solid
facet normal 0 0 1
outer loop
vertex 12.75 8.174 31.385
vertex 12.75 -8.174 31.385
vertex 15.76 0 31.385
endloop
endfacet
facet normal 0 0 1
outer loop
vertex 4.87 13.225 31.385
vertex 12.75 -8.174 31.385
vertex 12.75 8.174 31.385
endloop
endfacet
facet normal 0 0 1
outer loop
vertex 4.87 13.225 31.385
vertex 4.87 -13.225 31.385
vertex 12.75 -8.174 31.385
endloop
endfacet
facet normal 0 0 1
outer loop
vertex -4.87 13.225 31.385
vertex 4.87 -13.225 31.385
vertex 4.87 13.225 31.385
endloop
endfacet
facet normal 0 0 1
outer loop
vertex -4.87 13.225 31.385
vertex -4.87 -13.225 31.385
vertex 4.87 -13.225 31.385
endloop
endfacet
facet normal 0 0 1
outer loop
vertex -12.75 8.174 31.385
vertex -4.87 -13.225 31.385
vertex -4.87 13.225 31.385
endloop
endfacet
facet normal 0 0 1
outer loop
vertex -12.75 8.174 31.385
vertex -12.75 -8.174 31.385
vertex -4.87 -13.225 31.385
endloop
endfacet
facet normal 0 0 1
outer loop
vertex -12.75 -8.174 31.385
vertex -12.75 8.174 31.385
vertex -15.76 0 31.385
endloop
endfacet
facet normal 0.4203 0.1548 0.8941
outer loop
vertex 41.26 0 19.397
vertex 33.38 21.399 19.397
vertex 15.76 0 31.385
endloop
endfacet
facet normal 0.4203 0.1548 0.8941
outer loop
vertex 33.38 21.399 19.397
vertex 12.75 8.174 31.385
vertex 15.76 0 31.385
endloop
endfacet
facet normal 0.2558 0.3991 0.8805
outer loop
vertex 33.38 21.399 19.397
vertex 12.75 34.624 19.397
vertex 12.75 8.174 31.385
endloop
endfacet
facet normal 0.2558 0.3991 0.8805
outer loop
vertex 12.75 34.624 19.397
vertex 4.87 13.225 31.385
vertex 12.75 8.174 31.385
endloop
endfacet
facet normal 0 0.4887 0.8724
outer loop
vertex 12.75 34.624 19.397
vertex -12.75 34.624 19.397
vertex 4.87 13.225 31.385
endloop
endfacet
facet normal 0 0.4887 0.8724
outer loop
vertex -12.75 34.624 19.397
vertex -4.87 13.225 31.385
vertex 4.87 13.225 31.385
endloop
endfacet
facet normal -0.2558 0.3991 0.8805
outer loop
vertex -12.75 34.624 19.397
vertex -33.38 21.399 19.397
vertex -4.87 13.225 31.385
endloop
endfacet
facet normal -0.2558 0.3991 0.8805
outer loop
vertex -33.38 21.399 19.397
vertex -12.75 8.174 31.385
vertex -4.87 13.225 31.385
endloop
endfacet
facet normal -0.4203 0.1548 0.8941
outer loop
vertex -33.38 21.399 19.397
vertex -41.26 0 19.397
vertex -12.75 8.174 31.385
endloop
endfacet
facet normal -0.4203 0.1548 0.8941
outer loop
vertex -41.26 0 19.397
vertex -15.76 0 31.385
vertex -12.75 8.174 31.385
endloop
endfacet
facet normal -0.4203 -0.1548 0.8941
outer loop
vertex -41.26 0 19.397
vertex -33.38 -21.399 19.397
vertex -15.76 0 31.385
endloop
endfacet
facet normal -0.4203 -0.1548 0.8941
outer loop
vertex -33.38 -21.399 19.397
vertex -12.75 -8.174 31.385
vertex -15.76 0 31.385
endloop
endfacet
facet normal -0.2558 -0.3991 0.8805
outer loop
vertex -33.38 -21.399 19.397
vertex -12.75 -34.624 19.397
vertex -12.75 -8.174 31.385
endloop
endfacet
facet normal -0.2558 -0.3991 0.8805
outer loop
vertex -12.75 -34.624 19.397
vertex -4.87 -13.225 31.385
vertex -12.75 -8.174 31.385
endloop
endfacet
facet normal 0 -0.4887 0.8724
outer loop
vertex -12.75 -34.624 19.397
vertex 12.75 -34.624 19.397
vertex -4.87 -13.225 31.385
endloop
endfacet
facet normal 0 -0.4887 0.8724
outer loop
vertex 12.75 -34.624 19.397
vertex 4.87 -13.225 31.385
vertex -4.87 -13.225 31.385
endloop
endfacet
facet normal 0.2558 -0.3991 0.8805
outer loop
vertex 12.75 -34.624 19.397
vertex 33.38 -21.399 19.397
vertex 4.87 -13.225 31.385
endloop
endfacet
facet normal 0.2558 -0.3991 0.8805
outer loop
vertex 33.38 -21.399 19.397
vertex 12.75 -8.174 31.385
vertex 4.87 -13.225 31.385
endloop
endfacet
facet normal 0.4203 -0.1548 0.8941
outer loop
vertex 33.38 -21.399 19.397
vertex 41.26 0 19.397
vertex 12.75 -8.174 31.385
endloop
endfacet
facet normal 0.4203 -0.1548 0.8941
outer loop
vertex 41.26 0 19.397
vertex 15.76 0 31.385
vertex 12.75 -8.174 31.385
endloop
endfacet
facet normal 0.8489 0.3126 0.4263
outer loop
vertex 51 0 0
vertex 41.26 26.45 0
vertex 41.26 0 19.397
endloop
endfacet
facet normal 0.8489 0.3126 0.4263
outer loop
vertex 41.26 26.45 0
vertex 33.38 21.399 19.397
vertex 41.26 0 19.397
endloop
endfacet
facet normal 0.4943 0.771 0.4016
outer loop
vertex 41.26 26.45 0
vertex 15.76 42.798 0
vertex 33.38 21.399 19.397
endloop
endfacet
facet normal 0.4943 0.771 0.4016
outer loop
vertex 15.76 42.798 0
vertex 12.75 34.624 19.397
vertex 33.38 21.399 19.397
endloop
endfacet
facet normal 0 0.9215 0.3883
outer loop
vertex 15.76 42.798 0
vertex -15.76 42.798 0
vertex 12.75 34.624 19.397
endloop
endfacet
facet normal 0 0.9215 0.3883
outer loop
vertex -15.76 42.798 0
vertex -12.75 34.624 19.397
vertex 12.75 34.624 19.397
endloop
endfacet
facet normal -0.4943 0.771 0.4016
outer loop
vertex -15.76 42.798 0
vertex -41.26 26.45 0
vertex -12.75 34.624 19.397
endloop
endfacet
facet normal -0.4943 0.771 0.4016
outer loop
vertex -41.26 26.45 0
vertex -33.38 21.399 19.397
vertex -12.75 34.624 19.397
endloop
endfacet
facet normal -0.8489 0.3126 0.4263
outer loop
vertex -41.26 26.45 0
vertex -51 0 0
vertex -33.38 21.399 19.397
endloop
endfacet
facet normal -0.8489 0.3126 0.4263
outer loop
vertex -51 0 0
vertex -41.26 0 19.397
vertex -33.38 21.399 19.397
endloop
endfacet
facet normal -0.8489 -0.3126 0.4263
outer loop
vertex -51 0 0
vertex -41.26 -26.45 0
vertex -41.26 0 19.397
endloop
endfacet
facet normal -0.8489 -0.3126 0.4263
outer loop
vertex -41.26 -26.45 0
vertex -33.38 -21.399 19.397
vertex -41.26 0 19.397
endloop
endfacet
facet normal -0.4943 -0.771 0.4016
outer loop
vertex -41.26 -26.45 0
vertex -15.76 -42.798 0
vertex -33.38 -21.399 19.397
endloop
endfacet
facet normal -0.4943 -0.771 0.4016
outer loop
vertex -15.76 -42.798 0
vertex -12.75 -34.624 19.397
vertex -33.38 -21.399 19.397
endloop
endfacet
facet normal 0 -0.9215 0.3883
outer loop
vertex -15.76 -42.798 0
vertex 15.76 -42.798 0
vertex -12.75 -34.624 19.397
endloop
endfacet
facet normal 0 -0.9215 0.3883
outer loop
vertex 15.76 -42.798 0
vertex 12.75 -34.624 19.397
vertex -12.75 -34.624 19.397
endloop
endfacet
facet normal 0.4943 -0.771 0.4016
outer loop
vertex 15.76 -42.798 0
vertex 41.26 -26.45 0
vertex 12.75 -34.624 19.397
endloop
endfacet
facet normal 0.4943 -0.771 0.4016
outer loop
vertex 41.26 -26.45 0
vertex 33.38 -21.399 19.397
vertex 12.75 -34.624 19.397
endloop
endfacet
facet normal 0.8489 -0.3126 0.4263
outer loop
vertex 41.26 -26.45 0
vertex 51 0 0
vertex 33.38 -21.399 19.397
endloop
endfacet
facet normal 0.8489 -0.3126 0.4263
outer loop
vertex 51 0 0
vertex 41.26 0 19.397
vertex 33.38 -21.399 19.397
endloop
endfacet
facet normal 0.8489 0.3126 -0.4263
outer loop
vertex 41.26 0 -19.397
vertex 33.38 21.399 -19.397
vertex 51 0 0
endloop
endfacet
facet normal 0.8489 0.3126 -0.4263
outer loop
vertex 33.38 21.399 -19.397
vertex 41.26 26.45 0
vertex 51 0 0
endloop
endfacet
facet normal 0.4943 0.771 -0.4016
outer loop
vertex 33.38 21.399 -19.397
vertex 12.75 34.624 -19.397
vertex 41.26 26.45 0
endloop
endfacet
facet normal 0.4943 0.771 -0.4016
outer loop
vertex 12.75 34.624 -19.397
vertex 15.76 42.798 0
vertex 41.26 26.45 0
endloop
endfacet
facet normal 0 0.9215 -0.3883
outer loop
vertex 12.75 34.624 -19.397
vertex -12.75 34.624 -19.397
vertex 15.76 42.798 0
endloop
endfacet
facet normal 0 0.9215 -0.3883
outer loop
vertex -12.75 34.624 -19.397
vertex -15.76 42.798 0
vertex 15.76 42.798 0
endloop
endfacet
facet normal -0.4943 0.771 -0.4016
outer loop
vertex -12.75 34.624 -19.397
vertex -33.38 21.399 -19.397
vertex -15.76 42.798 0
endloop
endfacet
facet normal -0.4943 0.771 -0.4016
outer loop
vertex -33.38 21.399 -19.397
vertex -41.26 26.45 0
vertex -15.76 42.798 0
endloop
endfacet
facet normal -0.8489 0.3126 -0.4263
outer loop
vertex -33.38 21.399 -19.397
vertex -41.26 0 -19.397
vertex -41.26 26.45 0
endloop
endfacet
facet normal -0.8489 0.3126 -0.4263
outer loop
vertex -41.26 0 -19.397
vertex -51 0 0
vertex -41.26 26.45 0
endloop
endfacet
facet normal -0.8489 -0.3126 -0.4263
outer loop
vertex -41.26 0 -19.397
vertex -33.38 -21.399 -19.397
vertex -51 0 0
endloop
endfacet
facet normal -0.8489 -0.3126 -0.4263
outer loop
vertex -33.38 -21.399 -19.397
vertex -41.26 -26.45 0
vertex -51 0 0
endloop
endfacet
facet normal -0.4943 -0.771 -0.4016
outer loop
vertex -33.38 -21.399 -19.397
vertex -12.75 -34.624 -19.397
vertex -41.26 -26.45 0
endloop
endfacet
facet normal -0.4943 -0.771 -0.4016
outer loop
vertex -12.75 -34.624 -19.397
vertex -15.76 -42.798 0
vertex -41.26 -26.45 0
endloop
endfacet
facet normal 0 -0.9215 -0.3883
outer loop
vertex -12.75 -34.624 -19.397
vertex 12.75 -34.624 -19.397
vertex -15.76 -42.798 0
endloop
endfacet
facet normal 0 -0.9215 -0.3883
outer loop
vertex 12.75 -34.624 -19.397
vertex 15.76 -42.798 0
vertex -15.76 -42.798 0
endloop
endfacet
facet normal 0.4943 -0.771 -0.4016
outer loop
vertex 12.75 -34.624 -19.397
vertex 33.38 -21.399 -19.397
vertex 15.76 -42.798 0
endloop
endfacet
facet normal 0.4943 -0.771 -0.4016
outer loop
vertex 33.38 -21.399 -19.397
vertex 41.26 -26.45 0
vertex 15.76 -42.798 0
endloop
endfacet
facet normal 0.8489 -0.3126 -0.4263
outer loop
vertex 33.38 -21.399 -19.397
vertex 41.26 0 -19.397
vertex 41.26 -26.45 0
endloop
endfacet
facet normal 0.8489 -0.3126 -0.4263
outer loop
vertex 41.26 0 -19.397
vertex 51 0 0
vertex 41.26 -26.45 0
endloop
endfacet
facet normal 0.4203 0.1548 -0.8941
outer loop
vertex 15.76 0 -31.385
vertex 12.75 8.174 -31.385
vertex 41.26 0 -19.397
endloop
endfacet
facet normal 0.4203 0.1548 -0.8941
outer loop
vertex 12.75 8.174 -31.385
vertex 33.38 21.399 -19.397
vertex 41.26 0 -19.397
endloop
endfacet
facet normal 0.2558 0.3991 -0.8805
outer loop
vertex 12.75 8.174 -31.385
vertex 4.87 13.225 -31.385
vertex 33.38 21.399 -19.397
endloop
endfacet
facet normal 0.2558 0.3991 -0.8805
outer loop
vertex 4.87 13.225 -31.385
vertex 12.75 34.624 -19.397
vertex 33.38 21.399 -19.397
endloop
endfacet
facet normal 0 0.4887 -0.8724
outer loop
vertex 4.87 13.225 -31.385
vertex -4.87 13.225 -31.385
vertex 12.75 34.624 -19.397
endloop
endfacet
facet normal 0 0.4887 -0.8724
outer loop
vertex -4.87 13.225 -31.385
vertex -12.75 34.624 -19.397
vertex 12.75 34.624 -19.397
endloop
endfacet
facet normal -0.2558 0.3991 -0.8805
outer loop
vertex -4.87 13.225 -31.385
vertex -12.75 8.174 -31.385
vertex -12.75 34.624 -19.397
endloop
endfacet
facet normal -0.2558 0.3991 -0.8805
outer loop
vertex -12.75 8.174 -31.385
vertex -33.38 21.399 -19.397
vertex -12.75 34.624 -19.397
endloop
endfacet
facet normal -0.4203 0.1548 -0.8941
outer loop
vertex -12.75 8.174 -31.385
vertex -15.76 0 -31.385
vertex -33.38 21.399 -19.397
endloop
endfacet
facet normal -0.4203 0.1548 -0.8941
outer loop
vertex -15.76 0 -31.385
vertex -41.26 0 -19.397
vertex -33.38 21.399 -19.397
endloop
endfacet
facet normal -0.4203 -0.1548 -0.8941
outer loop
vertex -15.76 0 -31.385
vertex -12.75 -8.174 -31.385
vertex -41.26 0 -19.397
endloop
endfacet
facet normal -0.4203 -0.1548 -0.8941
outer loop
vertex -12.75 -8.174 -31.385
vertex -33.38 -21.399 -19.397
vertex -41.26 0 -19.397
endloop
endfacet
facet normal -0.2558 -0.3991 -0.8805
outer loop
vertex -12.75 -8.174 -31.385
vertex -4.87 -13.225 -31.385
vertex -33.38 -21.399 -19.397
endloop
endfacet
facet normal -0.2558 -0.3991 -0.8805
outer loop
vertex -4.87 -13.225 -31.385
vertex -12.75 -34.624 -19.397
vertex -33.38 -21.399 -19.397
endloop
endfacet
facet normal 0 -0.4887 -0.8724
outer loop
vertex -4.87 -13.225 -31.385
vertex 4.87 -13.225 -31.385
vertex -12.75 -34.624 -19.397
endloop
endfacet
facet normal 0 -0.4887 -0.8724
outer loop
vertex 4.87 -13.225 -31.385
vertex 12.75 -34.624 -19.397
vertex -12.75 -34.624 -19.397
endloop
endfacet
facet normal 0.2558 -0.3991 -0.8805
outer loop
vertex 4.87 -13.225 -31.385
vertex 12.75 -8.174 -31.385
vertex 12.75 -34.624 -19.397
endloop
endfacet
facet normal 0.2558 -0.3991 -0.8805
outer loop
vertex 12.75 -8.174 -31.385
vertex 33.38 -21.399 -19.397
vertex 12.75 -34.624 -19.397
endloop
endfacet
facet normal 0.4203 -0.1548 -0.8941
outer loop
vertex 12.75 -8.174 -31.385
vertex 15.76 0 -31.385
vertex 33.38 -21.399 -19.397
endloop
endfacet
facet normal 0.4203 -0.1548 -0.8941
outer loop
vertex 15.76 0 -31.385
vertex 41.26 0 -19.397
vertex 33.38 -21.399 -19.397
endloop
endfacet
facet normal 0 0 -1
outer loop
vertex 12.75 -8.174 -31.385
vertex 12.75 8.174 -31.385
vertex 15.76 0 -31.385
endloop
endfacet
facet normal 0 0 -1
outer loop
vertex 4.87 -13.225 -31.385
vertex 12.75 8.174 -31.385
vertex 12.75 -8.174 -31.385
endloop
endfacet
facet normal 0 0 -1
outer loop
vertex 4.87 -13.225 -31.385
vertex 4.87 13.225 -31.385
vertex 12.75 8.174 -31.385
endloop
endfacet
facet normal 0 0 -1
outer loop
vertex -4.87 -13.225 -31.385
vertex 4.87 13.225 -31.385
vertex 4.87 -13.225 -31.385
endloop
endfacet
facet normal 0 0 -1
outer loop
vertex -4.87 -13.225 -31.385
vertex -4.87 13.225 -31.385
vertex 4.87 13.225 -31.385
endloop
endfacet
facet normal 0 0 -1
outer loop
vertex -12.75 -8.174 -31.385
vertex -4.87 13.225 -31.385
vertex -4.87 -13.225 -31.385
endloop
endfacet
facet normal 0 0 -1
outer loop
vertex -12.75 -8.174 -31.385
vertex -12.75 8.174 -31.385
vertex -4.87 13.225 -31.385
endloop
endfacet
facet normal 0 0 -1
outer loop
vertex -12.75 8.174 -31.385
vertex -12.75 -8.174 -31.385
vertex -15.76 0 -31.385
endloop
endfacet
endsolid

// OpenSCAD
// Generated by SolidPython 1.0.1 on 2020-07-29 00:46:53


scale(v = [17, 15, 11]) {
	sphere(r = 3);
}
/***********************************************
*********      SolidPython code:      **********
************************************************
 
# import packages: SolidPython
from solid import *
from solid.utils import *
from itertools import chain, combinations, permutations


class Resize:

    def __init__(self, scad_file):
        self.scad_file = scad_file
        #self.scad_file = import_scad(scad_file)
        # cone/cylinder param:
        self.r1 = 0
        self.r2 = 0
        self.h = 0
        # rectangular prism param:
        self.w = 0
        self.l = 0
        # ellipse param:
        self.r = 0

    # import OpenScad code (file name corresponds to shape)


    # classify shape + parameters
    def assign(self, param1, param2, param3):
        if self.scad_file == 'cone.scad':
            self.r1 = param1
            self.r2 = param2
            self.h = param3
        elif self.scad_file == 'cylinder.scad':
            self.r1 = param1
            self.r2 = param2
            self.h = param3
        elif self.scad_file == 'rectangularPrism.scad':
            self.h = param1
            self.l = param2
            self.w = param3
        else:
            self.r = param1
            self.h = param2

    # resize parameters
    def iterate(self):
        x = range(3, 20, 2)
        i = 1
        if self.scad_file == 'cone.scad':
            tempList = list(permutations(x, 2))
            for temp in tempList:
                param1 = temp[0]
                param2 = temp[1]
                filepath = 'produced_scad_files/' + 'cone' + str(param1) + '_' + str(param2) + '_' + '.scad'
                scad_render_to_file(cylinder(h=param1, r1=param2, r2=0), filepath)

        elif self.scad_file == 'cylinder.scad':
            tempList = list(permutations(x, 3))
            for temp in tempList:
                param1 = temp[0]
                param2 = temp[1]
                filepath = 'produced_scad_files/' + 'cylinder' + str(param1) + '_' + str(param2) + '_' + '.scad'
                scad_render_to_file(cylinder(h=param1, r1=param2, r2=param2), filepath)

        elif self.scad_file == 'rectangularPrism.scad':
            tempList = list(permutations(x, 3))
            for temp in tempList:
                param1 = temp[0]
                param2 = temp[1]
                param3 = temp[2]
                filepath = 'produced_scad_files/' + 'rectangularPrism' + str(param1) + '_' + str(param2) + '_' + str(
                    param3) + '.scad'
                scad_render_to_file(cube(size=(param1, param2, param3)), filepath)

        elif self.scad_file == 'ellipse.scad':
            tempList = list(permutations(x, 4))
            for temp in tempList:
                param1 = temp[0]
                param2 = temp[1]
                param3 = temp[2]
                param4 = temp[3]
                filepath = 'produced_scad_files/' + 'ellipse' + str(param1) + '_' + str(param2) + '_' + str(param3) + '_' + str(param4) + '.scad'
                scad_render_to_file(scale([param1, param2, param3])(sphere(r=param4)), filepath)

    def render_to_scadfile(self):
        scad_render_to_file(scad, 'example.scad') 
 
************************************************/
